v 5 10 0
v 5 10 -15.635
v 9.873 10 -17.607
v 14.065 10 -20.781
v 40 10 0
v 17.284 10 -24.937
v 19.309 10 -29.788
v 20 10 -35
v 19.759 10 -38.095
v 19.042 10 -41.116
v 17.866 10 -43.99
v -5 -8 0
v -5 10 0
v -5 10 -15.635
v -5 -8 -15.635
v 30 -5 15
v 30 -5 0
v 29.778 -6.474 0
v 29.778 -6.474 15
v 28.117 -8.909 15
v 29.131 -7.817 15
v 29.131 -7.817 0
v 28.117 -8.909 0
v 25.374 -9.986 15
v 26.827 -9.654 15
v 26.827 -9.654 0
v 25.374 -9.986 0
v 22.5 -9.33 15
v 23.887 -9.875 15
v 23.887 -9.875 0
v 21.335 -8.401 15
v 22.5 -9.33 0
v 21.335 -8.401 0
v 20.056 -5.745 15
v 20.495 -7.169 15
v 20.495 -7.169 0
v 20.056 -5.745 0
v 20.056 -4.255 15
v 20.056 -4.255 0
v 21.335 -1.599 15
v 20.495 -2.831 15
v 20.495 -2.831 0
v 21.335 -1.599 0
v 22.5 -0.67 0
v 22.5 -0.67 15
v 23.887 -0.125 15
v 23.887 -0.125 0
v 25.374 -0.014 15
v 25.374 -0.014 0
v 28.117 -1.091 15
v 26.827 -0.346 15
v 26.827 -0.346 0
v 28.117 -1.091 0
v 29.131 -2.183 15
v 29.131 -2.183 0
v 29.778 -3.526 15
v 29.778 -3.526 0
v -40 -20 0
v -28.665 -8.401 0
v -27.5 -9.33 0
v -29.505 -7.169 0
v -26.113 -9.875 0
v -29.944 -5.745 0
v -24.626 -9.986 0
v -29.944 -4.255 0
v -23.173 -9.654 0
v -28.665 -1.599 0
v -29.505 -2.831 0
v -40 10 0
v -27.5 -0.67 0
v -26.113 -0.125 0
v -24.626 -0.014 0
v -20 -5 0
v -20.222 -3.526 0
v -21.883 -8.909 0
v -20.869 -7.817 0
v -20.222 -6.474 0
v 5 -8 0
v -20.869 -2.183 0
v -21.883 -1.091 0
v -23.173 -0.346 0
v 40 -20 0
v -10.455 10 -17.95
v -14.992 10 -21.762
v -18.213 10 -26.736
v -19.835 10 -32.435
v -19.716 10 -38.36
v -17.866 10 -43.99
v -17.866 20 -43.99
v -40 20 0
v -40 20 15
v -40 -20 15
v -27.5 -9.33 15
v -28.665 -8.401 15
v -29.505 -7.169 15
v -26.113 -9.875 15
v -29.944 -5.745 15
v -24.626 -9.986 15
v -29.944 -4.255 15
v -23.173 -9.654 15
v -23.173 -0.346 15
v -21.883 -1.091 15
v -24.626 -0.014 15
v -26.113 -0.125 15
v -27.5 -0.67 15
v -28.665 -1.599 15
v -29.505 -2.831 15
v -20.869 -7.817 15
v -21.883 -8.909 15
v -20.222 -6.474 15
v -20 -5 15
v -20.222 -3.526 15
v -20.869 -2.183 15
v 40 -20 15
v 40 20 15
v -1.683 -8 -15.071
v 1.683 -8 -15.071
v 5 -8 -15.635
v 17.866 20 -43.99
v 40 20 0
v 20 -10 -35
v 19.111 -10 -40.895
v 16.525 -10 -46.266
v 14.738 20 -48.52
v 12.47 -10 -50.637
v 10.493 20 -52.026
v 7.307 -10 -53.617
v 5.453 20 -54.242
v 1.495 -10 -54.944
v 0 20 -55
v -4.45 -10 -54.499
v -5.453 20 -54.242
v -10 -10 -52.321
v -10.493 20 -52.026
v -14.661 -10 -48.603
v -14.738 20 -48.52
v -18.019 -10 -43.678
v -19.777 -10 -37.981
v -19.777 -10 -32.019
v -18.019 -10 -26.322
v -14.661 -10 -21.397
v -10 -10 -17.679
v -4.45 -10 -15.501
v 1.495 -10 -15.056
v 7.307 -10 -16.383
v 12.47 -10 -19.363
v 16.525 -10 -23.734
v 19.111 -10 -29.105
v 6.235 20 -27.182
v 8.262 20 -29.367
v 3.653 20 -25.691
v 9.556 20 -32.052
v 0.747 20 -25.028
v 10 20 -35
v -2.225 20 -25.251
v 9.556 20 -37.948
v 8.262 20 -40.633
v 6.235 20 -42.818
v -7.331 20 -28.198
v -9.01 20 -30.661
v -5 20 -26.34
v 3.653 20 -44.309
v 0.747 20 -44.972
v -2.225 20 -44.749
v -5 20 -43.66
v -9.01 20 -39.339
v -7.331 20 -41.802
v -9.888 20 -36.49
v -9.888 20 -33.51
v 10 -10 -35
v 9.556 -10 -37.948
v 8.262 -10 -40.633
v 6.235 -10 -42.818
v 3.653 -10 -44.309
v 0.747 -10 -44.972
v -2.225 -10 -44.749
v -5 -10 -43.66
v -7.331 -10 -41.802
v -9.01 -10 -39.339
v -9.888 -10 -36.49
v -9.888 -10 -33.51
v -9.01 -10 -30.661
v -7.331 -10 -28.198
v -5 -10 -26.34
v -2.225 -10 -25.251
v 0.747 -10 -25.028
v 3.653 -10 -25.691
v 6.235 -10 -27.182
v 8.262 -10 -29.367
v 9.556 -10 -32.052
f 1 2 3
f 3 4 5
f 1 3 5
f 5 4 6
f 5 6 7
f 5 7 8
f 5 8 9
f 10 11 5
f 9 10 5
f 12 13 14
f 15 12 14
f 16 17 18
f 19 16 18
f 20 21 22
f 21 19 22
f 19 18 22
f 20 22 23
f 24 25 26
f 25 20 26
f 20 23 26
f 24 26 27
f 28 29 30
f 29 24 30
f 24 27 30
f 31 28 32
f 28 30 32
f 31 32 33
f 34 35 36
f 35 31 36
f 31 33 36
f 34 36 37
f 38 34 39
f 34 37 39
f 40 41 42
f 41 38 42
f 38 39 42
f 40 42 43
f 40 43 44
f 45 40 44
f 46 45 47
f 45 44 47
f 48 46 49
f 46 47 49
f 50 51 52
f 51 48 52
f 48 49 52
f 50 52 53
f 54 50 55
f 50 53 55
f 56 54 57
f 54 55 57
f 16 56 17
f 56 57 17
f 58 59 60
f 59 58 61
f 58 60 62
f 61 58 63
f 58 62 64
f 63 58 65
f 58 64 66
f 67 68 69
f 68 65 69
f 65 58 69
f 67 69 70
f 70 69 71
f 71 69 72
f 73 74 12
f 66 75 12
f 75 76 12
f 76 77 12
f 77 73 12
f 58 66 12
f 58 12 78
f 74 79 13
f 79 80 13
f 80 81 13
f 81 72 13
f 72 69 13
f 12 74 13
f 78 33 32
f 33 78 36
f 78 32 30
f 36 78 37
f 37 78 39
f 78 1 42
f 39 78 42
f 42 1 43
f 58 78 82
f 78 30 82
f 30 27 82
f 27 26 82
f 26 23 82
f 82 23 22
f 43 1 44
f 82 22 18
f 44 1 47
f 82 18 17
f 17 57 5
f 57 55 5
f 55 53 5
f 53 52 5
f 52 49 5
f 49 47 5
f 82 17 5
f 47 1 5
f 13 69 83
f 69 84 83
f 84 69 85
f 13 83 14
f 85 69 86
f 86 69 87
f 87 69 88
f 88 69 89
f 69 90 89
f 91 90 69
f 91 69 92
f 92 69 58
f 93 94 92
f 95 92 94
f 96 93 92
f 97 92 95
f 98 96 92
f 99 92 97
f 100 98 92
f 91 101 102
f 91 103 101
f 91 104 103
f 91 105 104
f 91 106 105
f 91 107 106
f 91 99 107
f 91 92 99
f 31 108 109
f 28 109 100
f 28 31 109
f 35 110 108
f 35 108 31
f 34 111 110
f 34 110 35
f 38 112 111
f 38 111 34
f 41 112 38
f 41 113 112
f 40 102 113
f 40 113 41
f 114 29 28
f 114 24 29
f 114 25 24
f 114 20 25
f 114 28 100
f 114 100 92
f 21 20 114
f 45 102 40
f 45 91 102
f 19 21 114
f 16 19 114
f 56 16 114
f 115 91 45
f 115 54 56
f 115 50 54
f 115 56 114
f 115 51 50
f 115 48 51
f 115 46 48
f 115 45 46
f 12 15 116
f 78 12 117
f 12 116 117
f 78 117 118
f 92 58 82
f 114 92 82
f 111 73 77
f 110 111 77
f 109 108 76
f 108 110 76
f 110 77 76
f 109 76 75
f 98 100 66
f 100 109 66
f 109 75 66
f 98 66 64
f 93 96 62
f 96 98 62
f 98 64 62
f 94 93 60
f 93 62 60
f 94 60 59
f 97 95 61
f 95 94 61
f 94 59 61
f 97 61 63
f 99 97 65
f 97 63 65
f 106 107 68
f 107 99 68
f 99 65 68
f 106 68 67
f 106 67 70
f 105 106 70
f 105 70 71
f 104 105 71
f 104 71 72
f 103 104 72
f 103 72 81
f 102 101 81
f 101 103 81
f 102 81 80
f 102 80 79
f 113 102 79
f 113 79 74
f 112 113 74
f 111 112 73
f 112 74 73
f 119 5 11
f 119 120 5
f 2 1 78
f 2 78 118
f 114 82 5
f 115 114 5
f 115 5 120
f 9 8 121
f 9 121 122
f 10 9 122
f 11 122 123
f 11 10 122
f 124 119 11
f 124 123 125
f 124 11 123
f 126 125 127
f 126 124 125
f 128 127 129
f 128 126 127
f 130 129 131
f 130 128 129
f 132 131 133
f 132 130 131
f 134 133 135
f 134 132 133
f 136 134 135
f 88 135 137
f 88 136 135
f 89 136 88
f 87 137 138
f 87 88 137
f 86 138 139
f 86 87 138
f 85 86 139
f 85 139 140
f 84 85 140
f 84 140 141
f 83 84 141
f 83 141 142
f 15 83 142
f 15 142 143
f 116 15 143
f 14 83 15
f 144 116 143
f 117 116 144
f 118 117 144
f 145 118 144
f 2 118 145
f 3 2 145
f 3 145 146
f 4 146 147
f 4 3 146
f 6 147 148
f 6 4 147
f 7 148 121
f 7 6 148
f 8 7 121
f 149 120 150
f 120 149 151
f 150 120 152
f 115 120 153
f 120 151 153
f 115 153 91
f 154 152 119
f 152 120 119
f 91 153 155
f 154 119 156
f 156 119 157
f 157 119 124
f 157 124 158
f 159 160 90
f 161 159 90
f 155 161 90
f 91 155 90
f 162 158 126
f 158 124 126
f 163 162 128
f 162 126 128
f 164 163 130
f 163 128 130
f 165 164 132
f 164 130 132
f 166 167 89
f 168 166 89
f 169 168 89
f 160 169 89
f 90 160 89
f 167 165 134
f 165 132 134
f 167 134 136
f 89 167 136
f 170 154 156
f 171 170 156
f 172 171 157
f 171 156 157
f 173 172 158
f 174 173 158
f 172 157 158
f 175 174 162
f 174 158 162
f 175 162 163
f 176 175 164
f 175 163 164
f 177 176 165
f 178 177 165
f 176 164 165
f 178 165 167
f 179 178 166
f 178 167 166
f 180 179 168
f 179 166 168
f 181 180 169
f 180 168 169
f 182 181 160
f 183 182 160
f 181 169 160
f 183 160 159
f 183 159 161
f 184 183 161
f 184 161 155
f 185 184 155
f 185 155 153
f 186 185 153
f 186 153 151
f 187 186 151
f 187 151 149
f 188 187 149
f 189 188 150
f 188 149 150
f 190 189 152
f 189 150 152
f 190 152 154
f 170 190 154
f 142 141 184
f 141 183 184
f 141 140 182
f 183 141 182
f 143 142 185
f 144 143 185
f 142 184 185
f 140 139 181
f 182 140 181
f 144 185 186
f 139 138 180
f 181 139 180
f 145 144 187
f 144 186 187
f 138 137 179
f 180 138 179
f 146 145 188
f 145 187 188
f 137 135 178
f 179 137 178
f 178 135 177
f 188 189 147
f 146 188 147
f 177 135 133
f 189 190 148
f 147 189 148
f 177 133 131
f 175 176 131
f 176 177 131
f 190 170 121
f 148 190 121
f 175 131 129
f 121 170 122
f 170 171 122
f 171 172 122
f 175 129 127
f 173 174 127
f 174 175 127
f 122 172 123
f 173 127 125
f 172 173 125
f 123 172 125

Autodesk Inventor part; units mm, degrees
ref_plane "YZ Plane" through (0, 0, 0) normal (1, 0, 0) x (0, 1, 0)
ref_plane "XZ Plane" through (0, 0, 0) normal (0, 1, 0) x (-1, 0, 0)
ref_plane "XY Plane" through (0, 0, 0) normal (0, 0, 1) x (1, 0, 0)
sketch "Szkic1" plane through (0, 0, 0) normal (0, 0, 1) x (1, 0, 0)
  line L0 (-40, -20) -> (40, -20)
  line L1 (40, -20) -> (40, 20)
  line L2 (40, 20) -> (-40, 20)
  line L3 (-40, 20) -> (-40, -20)
  circle A0 centre (-25, -5) radius 5
  circle A1 centre (25, -5) radius 5
  point P0 (0, 0)
  dimension "d0" = 80
  dimension "d1" = 40
  dimension "d2" = 10
  dimension "d3" = 10
  dimension "d5" = 15
  dimension "d6" = 15
  dimension "d7" = 15
  dimension "d8" = 50
extrude "Wyciągnięcie proste1" add sketch "Szkic1" along normal blind 15
sketch "Szkic3" plane through (-40, 20, 0) normal (0, 1, 0) x (1, 0, 0)
  circle A0 centre (40, 35) radius 20
  circle A1 centre (40, 35) radius 10
  line L0 (80, 0) -> (80, -15) projected
  line L1 (0, -15) -> (80, -15) projected
  line L2 (0, 0) -> (22.1342, 43.9895)
  line L3 (80, 0) -> (57.8658, 43.9895)
  line L4 (80, 0) -> (0, 0)
  line L5 (35, 0) -> (35, 15.6351)
  line L6 (45, 0) -> (45, 15.6351)
  point P0 (40, 0)
  dimension "d13" = 40
  dimension "d14" = 20
  dimension "d15" = 40
  dimension "d16" = 50
  dimension "d17" = 10
extrude "Wyciągnięcie proste2" add sketch "Szkic3" against normal blind 30 contours A0
extrude "Wyciągnięcie proste3" add sketch "Szkic3" against normal blind 28 contours L6 L4 L5 A0
extrude "Wyciągnięcie proste4" add sketch "Szkic3" against normal blind 10 contours A0 L3 L4 L6 | A0 L5 L4 L2
properties part number "Bartosz_Zukowski_model_nr_6"
